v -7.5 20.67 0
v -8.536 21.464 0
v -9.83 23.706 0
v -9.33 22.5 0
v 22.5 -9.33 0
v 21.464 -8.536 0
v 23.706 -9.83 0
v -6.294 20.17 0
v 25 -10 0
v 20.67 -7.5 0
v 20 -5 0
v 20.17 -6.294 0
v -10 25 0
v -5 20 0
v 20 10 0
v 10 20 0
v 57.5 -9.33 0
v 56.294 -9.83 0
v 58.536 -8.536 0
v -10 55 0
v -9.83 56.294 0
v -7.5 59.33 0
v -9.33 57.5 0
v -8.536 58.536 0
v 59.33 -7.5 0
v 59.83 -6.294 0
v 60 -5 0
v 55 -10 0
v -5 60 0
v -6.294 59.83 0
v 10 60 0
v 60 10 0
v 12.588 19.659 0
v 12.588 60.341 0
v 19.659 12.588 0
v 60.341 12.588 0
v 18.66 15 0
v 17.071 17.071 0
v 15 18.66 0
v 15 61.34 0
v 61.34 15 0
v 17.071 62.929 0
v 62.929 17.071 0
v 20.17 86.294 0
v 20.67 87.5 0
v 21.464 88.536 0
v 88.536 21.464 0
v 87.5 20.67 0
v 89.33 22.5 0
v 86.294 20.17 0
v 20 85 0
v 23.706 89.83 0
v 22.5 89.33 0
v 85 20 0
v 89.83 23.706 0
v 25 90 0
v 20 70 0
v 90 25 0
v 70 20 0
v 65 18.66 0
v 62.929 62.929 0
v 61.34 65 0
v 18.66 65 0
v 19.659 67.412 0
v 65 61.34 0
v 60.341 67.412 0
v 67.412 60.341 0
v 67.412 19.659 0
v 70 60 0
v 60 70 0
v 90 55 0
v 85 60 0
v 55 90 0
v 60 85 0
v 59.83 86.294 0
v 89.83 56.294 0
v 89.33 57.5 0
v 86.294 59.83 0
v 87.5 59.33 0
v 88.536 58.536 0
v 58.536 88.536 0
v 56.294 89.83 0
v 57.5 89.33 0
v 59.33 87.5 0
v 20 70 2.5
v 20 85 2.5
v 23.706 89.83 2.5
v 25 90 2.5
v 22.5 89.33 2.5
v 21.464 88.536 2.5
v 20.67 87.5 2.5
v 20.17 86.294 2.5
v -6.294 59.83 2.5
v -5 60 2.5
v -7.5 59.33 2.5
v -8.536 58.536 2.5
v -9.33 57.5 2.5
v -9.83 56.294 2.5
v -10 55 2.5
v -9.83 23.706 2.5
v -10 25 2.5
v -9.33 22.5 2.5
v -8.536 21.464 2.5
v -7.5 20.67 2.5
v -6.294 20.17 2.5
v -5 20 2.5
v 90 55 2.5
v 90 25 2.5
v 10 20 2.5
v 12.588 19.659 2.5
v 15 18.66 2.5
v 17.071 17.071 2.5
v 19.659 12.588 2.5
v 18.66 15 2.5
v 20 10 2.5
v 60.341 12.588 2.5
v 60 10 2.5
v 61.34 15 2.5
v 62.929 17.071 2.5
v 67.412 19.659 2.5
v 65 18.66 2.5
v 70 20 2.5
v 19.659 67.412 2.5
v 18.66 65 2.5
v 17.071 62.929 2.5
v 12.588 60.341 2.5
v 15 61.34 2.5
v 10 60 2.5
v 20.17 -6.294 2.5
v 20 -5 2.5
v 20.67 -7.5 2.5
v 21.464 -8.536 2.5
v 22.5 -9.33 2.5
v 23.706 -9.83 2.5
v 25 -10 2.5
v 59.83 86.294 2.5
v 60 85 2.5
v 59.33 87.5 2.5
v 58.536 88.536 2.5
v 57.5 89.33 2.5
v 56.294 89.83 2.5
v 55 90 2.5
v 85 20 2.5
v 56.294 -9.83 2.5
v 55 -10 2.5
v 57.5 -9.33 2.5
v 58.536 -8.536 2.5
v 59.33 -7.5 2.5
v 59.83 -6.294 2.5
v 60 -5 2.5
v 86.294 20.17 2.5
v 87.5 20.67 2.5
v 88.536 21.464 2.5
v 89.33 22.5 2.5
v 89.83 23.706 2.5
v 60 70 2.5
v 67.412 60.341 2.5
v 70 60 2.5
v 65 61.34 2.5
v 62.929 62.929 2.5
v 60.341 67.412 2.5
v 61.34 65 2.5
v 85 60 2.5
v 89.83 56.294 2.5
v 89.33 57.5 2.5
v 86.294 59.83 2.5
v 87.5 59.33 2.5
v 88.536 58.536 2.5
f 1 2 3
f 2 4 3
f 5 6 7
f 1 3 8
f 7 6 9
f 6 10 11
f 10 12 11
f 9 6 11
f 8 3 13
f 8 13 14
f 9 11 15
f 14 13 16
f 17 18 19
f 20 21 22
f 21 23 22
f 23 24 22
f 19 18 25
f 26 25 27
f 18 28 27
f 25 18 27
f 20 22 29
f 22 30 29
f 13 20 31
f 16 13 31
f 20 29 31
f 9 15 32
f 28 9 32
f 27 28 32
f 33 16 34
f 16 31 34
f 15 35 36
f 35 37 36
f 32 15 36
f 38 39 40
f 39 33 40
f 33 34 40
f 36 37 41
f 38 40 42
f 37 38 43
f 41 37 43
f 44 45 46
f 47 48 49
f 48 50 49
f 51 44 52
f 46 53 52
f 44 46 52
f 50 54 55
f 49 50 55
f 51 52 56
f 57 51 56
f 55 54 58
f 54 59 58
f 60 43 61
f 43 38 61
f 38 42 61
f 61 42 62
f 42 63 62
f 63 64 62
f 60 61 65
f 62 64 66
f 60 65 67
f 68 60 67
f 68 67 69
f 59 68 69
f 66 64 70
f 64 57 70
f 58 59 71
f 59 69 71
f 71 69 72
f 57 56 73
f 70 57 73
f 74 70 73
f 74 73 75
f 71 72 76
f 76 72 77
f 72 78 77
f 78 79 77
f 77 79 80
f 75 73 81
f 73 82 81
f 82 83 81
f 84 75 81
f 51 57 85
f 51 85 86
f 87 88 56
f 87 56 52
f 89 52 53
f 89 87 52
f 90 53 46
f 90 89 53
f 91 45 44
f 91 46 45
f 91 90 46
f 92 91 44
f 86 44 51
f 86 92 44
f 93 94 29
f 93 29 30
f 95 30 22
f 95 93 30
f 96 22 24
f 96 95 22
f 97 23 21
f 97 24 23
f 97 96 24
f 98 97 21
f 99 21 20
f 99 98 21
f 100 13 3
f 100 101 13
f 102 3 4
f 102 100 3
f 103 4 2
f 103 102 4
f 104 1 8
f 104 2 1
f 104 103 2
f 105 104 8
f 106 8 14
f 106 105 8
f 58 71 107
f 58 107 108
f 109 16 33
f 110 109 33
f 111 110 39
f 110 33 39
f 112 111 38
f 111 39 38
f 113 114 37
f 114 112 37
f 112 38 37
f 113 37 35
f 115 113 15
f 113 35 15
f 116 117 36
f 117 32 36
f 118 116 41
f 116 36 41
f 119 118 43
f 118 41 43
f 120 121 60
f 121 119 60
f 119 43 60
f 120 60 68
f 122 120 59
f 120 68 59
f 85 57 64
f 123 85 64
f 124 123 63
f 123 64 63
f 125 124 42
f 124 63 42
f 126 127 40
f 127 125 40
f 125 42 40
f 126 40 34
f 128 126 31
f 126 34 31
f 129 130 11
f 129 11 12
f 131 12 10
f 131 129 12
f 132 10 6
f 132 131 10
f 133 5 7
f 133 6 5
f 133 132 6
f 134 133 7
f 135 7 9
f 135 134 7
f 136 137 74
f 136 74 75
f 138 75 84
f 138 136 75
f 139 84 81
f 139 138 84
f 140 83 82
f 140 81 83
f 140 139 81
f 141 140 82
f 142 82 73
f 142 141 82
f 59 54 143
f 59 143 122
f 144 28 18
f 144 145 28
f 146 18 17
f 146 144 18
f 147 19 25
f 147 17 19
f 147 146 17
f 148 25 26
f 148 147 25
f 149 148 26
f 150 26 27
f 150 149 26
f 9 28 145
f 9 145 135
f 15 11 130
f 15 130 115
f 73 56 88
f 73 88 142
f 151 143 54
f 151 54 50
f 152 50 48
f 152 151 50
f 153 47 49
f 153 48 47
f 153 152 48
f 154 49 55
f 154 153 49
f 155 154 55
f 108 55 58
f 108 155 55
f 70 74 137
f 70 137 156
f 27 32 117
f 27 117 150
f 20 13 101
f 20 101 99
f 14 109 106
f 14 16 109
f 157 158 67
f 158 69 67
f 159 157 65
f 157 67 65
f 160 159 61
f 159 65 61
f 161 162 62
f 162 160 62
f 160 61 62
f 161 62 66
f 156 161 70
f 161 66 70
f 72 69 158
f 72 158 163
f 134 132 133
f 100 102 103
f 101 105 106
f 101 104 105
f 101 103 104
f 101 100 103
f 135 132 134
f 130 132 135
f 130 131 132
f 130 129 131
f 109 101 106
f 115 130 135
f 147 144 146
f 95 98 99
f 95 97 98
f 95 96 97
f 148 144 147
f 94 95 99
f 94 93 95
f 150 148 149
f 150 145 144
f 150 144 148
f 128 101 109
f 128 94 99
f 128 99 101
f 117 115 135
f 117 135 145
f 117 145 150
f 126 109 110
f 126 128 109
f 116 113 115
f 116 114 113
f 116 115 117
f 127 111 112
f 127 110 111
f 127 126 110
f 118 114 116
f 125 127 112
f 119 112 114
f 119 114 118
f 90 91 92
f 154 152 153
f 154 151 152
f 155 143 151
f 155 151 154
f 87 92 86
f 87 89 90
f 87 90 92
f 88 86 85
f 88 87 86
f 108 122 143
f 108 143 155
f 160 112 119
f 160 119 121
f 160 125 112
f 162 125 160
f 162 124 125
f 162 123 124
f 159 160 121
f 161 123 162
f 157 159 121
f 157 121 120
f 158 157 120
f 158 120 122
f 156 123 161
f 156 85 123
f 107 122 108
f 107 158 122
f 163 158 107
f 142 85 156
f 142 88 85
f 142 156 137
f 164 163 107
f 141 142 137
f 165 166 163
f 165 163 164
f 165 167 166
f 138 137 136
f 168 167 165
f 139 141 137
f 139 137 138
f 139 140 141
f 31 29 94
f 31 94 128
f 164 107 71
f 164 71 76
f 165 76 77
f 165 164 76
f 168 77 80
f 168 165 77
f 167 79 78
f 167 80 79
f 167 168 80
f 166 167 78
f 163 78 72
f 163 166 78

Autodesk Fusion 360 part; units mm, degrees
sketch "Sketch1" plane through (0, 0, 0) normal (0, 0, 1) x (1, 0, 0)
  line L0 (-10, 20) -> (-10, 60)
  line L1 (90, 60) -> (90, 20)
  line L2 (90, 20) -> (-10, 60) construction
  line L3 (-10, 20) -> (90, 60) construction
  line L4 (60, -10) -> (20, -10)
  line L5 (20, 90) -> (60, 90)
  line L6 (60, -10) -> (20, 90) construction
  line L7 (20, -10) -> (60, 90) construction
  line L8 (-10, 60) -> (10, 60)
  line L9 (70, 60) -> (90, 60)
  line L10 (60, 90) -> (60, 70)
  line L11 (60, 10) -> (60, -10)
  line L12 (90, 20) -> (70, 20)
  line L13 (10, 20) -> (-10, 20)
  line L14 (20, -10) -> (20, 10)
  line L15 (20, 70) -> (20, 90)
  arc A0 (10, 60) -> (20, 70) centre (10, 70) ccw
  arc A1 (60, 70) -> (70, 60) centre (70, 70) ccw
  arc A2 (70, 20) -> (60, 10) centre (70, 10) ccw
  arc A3 (20, 10) -> (10, 20) centre (10, 10) ccw
  point P0 (40, 40)
  point P1 (40, 40)
  dimension "d1" = 100
  dimension "d2" = 40
  dimension "d3" = 40
  dimension "d4" = 100
  dimension "d5" = 10
  dimension "d6" = 10
  dimension "d7" = 10
  dimension "d8" = 10
extrude "Extrude1" add sketch "Sketch1" along normal blind 2.5
fillet "Fillet1" radius 5 1 edges at (60, -10, 1.25)
fillet "Fillet2" radius 5 1 edges at (20, -10, 1.25)
fillet "Fillet3" radius 5 1 edges at (-10, 20, 1.25)
fillet "Fillet4" radius 5 2 edges at (-10, 60, 1.25) (20, 90, 1.25)
fillet "Fillet5" radius 5 2 edges at (60, 90, 1.25) (90, 60, 1.25)
fillet "Fillet6" radius 5 1 edges at (90, 20, 1.25)
